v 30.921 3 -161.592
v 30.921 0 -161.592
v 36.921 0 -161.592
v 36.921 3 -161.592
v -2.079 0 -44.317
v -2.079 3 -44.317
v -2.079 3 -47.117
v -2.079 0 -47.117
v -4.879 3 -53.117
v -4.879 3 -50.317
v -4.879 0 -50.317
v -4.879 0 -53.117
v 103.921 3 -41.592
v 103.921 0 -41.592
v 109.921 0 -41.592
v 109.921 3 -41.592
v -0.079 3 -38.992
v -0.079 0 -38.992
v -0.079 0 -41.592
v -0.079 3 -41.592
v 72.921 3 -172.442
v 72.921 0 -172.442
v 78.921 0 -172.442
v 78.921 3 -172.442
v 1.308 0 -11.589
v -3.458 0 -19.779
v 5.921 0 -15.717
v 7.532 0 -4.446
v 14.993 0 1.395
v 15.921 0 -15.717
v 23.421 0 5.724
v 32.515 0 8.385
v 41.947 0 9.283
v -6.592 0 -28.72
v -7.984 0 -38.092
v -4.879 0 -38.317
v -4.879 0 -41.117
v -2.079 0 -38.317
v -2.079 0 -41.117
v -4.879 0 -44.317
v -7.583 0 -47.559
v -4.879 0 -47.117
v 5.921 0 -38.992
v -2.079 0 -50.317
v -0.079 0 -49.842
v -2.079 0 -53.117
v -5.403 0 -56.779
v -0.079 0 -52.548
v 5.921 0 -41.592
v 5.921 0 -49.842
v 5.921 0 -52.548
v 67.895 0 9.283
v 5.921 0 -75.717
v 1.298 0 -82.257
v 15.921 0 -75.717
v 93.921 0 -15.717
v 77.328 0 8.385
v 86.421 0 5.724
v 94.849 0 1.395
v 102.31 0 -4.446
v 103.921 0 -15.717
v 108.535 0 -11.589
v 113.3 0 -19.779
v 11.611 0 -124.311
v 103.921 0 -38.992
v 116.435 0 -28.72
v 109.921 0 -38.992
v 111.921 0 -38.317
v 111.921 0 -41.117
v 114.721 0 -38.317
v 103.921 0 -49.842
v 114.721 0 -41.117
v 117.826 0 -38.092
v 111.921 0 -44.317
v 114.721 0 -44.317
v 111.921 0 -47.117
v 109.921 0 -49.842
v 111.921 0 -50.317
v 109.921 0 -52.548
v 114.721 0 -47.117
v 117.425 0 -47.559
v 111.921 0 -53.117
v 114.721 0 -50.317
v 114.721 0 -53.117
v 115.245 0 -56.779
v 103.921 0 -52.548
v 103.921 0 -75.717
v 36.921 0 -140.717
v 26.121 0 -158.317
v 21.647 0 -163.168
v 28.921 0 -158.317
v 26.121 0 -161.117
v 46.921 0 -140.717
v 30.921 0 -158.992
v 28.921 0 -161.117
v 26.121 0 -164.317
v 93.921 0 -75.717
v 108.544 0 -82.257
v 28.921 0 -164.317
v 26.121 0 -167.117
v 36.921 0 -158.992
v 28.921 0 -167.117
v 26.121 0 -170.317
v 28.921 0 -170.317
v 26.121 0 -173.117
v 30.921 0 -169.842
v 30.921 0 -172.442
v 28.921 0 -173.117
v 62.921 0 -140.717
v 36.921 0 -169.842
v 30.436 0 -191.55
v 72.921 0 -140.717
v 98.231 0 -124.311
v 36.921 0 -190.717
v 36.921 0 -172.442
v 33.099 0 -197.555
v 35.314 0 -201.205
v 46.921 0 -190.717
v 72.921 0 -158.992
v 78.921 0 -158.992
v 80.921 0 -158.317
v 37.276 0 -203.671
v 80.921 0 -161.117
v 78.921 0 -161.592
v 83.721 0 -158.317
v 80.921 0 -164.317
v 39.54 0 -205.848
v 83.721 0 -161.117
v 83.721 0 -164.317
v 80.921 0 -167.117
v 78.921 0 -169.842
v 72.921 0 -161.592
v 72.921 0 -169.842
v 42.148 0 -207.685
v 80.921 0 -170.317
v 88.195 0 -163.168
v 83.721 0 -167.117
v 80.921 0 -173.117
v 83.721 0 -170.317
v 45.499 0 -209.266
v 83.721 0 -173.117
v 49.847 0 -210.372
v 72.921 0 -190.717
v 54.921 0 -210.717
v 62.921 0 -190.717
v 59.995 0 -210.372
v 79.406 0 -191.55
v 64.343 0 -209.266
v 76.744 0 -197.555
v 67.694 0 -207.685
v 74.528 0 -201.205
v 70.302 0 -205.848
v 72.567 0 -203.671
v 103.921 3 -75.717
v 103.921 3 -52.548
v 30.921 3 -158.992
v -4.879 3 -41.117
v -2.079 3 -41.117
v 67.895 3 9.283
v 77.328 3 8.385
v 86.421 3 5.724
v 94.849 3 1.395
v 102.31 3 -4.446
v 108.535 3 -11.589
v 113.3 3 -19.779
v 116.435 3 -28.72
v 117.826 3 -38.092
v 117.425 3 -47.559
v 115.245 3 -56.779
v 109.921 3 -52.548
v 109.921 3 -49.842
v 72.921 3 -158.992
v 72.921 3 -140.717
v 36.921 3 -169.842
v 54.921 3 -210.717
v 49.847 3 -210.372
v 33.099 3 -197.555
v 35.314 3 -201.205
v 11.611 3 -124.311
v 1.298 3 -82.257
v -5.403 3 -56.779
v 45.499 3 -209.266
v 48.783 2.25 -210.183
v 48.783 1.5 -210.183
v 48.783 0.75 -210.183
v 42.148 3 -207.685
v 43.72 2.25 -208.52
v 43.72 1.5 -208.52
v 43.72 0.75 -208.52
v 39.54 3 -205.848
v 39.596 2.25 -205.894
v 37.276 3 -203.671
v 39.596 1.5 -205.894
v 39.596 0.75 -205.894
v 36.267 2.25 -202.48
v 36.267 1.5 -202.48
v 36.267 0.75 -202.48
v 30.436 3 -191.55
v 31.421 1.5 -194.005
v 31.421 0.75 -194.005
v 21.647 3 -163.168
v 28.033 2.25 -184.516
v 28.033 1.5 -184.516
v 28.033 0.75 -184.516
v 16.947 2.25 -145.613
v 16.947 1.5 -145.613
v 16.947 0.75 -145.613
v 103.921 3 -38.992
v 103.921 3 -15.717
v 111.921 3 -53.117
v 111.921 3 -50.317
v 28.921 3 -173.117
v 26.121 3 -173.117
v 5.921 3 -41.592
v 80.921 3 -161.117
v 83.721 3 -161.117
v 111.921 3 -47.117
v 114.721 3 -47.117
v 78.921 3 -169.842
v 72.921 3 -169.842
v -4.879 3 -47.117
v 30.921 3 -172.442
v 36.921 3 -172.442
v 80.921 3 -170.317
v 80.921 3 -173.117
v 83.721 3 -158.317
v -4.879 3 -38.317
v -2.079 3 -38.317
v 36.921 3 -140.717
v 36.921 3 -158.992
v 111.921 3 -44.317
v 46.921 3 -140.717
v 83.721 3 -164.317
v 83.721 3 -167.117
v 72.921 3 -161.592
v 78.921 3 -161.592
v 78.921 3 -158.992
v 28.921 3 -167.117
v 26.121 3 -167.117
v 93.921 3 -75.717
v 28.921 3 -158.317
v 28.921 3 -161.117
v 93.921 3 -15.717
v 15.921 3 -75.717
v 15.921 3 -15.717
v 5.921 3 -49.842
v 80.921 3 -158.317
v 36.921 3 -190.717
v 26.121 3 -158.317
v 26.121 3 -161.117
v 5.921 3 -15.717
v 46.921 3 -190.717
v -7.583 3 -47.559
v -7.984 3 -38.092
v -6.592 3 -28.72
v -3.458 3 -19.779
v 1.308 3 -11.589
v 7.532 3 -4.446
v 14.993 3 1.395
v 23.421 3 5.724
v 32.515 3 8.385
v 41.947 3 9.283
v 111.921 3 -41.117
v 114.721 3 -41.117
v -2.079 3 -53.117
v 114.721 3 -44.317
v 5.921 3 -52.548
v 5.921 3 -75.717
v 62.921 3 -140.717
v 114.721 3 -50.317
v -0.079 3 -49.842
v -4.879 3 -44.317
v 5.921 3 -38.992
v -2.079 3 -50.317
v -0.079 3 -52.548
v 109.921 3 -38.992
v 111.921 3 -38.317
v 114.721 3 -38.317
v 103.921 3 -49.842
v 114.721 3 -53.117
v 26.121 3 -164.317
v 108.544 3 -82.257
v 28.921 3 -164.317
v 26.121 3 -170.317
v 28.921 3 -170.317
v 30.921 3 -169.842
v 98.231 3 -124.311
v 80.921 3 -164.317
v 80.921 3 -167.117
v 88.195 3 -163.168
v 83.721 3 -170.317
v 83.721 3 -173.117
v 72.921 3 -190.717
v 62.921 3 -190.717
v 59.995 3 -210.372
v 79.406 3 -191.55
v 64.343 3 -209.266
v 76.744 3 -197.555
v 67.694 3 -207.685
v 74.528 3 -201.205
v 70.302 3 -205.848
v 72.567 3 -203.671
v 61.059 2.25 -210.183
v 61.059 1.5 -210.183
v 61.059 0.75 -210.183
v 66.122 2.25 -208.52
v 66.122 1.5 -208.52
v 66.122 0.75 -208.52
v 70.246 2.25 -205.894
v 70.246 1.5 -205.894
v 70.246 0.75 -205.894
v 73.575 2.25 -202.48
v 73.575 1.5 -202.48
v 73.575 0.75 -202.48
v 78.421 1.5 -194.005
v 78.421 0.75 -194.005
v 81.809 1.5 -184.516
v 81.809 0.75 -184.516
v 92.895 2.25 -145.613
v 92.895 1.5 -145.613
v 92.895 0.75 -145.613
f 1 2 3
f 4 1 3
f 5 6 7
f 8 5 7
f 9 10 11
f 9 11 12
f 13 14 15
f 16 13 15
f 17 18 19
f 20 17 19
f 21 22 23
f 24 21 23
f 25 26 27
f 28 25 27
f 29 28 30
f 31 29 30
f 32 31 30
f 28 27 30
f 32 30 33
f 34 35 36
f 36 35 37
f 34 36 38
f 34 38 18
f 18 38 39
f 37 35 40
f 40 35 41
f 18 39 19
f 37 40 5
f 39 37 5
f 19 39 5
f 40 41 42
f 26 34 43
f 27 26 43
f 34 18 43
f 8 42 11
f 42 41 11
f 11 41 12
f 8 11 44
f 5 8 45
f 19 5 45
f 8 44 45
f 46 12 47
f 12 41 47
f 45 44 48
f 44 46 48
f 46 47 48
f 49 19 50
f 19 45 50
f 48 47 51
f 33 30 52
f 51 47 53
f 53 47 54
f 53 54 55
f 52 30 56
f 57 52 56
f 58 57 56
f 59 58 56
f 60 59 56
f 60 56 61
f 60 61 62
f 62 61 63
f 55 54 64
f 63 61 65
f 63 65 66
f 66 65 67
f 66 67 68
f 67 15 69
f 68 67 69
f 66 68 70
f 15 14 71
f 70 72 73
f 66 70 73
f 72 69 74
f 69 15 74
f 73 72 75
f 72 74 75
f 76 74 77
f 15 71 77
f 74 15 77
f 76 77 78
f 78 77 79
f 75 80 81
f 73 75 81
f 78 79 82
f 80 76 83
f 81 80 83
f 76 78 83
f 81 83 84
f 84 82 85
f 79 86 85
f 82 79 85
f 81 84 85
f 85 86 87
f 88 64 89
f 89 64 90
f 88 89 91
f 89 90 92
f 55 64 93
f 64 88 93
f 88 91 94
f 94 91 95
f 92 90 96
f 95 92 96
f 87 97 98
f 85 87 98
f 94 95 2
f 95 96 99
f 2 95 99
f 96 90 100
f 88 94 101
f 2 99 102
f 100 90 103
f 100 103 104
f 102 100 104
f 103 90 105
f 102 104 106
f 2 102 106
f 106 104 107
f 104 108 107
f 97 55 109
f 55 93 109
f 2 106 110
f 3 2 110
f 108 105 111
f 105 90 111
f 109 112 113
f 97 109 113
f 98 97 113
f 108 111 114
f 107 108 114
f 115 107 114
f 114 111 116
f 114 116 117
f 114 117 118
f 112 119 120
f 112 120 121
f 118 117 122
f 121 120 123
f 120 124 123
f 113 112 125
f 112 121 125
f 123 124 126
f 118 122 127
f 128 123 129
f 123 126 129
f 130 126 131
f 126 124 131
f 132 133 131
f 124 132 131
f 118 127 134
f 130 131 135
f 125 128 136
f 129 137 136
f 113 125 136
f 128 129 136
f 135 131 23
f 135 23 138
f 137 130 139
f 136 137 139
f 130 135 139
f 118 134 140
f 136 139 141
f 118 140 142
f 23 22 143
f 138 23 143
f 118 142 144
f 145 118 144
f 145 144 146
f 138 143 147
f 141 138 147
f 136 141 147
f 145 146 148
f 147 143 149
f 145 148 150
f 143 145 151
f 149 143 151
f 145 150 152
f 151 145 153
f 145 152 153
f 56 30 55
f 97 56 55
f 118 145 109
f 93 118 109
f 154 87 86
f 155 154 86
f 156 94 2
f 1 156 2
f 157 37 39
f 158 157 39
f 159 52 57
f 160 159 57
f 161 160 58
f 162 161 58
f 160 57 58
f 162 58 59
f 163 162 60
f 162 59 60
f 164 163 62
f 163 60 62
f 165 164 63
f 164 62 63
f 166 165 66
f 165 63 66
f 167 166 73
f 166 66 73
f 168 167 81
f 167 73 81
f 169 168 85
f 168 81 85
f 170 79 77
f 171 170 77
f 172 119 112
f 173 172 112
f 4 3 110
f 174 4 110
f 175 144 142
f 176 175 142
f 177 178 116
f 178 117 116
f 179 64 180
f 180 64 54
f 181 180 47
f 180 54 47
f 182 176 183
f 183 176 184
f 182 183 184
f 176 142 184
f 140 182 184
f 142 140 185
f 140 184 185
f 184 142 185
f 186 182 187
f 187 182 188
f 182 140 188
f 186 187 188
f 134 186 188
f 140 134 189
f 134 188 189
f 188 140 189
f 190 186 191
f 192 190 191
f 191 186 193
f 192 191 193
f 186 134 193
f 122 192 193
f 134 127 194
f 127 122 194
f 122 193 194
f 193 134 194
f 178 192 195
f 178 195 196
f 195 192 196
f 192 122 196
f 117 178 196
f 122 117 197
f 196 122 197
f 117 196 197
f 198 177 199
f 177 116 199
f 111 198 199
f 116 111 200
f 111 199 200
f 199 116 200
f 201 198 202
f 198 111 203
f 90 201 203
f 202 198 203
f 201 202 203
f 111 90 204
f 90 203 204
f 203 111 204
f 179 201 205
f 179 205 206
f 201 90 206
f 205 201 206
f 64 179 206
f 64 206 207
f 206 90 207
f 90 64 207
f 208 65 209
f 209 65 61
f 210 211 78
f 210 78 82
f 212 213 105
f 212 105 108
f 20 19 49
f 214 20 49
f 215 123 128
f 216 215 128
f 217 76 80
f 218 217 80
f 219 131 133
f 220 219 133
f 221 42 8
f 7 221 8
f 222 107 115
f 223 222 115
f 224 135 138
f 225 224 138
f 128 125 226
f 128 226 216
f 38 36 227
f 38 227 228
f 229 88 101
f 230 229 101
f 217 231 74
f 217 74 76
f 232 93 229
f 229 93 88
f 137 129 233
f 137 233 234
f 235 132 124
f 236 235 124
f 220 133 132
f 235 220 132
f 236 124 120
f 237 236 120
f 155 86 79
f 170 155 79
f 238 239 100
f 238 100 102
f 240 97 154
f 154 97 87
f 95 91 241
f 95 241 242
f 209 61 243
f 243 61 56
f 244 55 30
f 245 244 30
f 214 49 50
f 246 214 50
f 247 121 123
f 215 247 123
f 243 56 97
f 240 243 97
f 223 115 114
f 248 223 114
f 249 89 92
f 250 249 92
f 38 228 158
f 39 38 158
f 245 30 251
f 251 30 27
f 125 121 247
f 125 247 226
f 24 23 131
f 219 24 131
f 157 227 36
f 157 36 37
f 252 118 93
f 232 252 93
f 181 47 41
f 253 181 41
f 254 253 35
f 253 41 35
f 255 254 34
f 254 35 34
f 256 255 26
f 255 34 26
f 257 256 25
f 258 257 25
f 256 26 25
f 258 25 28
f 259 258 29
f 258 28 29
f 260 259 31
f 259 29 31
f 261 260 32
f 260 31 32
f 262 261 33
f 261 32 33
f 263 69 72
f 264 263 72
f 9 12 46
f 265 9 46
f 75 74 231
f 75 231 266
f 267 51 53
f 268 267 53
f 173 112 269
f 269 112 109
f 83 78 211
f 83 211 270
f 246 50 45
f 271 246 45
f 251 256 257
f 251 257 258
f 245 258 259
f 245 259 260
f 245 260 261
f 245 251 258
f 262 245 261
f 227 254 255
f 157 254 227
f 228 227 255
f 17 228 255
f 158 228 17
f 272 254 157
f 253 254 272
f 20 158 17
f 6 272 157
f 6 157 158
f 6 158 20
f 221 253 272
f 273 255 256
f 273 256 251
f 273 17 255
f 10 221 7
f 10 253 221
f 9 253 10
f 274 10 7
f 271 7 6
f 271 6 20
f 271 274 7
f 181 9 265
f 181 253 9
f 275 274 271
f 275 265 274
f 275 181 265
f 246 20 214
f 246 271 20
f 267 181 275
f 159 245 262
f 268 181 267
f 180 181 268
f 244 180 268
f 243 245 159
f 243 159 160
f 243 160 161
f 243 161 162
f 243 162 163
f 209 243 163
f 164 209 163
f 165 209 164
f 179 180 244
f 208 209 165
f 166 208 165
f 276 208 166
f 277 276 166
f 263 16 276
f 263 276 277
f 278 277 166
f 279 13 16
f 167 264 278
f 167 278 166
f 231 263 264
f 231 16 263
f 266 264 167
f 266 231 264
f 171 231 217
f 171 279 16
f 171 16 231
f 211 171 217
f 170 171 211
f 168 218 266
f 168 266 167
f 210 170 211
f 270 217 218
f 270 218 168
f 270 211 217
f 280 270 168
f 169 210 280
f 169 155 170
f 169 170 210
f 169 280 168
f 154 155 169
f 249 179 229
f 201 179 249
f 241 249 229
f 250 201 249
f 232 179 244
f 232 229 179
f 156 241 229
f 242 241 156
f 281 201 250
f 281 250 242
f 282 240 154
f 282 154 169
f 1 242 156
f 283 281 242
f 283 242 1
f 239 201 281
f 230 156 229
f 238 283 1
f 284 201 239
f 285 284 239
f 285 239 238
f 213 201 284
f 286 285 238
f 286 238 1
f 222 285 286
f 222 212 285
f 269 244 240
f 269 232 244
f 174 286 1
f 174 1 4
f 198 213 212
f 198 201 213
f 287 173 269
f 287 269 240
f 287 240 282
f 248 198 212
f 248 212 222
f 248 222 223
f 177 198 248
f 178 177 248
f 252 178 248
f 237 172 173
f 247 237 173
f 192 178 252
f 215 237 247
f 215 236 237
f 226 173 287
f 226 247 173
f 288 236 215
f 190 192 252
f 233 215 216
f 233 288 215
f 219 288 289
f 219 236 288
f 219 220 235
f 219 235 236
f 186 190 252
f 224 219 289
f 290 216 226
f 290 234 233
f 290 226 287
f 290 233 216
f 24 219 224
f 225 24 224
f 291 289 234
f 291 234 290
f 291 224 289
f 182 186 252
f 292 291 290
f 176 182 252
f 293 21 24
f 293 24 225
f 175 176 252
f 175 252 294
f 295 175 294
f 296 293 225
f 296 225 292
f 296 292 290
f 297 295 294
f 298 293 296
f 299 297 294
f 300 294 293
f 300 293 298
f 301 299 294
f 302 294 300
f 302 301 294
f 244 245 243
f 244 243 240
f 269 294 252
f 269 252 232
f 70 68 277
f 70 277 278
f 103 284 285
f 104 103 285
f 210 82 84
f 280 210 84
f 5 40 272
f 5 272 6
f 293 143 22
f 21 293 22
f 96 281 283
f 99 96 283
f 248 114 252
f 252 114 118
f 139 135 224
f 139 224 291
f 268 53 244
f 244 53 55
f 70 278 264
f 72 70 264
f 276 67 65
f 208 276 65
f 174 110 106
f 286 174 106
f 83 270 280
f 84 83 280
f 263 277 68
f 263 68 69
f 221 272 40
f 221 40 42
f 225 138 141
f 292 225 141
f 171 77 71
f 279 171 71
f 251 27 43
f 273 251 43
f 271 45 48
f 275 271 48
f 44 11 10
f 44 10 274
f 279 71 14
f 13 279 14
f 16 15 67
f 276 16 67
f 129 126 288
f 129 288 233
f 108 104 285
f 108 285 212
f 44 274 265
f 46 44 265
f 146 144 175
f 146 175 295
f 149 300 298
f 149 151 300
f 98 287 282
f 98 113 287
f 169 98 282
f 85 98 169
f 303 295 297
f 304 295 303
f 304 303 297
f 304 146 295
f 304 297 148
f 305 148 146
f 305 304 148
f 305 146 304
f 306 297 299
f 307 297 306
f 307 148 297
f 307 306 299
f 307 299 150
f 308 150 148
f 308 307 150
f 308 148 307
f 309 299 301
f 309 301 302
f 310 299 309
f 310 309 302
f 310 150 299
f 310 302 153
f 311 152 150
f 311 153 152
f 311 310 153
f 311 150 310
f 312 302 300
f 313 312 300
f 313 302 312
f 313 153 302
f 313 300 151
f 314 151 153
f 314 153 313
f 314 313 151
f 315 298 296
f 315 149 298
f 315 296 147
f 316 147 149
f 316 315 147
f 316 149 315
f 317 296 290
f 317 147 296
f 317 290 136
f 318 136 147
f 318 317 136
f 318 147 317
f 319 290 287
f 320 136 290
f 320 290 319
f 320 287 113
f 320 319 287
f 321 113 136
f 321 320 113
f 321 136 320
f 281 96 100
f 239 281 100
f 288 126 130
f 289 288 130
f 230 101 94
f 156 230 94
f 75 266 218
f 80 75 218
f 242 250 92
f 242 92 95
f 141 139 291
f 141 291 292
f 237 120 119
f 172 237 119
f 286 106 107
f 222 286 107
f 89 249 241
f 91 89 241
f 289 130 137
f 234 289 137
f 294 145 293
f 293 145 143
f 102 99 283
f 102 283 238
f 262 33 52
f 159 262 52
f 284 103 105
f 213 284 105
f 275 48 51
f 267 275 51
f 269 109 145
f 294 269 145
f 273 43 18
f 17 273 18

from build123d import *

# Parameters (mm, degrees)
SKETCH1_W           = 2.8
SKETCH1_H           = 2.8
BOSS_EXTRUDE1_DEPTH = 3


with BuildPart() as part:
    # Sketch1 → Boss-Extrude1 (new body)
    # profile 1 of 2: a face of its own
    with BuildSketch(Plane(origin=(0, 0, 0), x_dir=(1, 0, 0), z_dir=(0, 1, 0))):
        with BuildLine():
            add(Edge.make_bspline(
                [(54.921096065, 210.717166967), (55.81137077, 210.717166967), (73.117418641, 210.307735596), (83.168598293, 181.782075712), (97.327570014, 130.307145356), (107.26026966, 85.588568253), (115.245027256, 56.779324779)],
                knots=[0, 0, 0, 0, 0.011068307, 0.221366141, 0.459883166, 1, 1, 1, 1], degree=3))
            Line((54.921096065, 210.717166967), (54.921096065, -9.282833033))
            Line((54.921096065, -9.282833033), (64.921096065, -9.282833033))
            Line((64.921096065, -9.282833033), (67.895190019, -9.282833033))
            ThreePointArc((67.895190019, -9.282833033), (108.534505285, 11.589069626), (115.245027256, 56.779324779))
        make_face()
        with Locations((113.321095998, 39.717166967)):
            Rectangle(SKETCH1_W, SKETCH1_H, mode=Mode.SUBTRACT)
        Polygon((103.921096065, 38.99216559), (103.921096065, 15.717166967), (93.921096065, 15.717166967), (93.921096065, 75.717166967), (103.921096065, 75.717166967), (103.921096065, 52.548230604), (109.921096065, 52.548230604), (109.921096065, 49.842166967), (103.921096065, 49.842166967), (103.921096065, 41.59216559), (109.921095998, 41.59216559), (109.921095998, 38.99216559), align=None, mode=Mode.SUBTRACT)
        with Locations((113.321096065, 45.717166967)):
            Rectangle(SKETCH1_W, SKETCH1_H, mode=Mode.SUBTRACT)
        with Locations((113.321096065, 51.717166967)):
            Rectangle(SKETCH1_W, SKETCH1_H, mode=Mode.SUBTRACT)
        Polygon((72.921096065, 158.992166967), (72.921096065, 140.717166967), (62.921096065, 140.717166967), (62.921096065, 190.717166967), (72.921096065, 190.717166967), (72.921096065, 172.442166967), (78.921096065, 172.442166967), (78.921096065, 169.842166967), (72.921096065, 169.842166967), (72.921096065, 161.592166967), (78.921096065, 161.592166967), (78.921096065, 158.992166967), align=None, mode=Mode.SUBTRACT)
        with Locations((82.321096065, 159.717166967)):
            Rectangle(SKETCH1_W, SKETCH1_H, mode=Mode.SUBTRACT)
        with Locations((82.321096065, 165.717166967)):
            Rectangle(SKETCH1_W, SKETCH1_H, mode=Mode.SUBTRACT)
        with Locations((82.321096065, 171.717166967)):
            Rectangle(SKETCH1_W, SKETCH1_H, mode=Mode.SUBTRACT)
    # profile 2 of 2: a face of its own
    with BuildSketch(Plane(origin=(0, 0, 0), x_dir=(1, 0, 0), z_dir=(0, 1, 0))):
        with BuildLine():
            Line((54.921096065, -9.282833033), (54.921096065, 210.717166967))
            add(Edge.make_bspline(
                [(54.921096065, 210.717166967), (54.030821359, 210.717166967), (36.724773488, 210.307735596), (26.673593836, 181.782075712), (12.514622115, 130.307145356), (2.58192247, 85.588568253), (-5.402835127, 56.779324779)],
                knots=[0, 0, 0, 0, 0.011068307, 0.221366141, 0.459883166, 1, 1, 1, 1], degree=3))
            ThreePointArc((-5.402835127, 56.779324779), (1.307686844, 11.589069626), (41.94700211, -9.282833033))
            Line((41.94700211, -9.282833033), (44.921096065, -9.282833033))
            Line((44.921096065, -9.282833033), (54.921096065, -9.282833033))
        make_face()
        with Locations((-3.478903869, 39.717166967)):
            Rectangle(SKETCH1_W, SKETCH1_H, mode=Mode.SUBTRACT)
        with Locations((-3.478903935, 45.717166967)):
            Rectangle(SKETCH1_W, SKETCH1_H, mode=Mode.SUBTRACT)
        with Locations((-3.478903935, 51.717166967)):
            Rectangle(SKETCH1_W, SKETCH1_H, mode=Mode.SUBTRACT)
        Polygon((5.921096065, 52.548230604), (5.921096065, 75.717166967), (15.921096065, 75.717166967), (15.921096065, 15.717166967), (5.921096065, 15.717166967), (5.921096065, 38.99216559), (-0.078903869, 38.99216559), (-0.078903869, 41.59216559), (5.921096131, 41.59216559), (5.921096065, 49.842166967), (-0.078903935, 49.842166967), (-0.078903935, 52.548230604), align=None, mode=Mode.SUBTRACT)
        with Locations((27.521096065, 159.717166967)):
            Rectangle(SKETCH1_W, SKETCH1_H, mode=Mode.SUBTRACT)
        with Locations((27.521096065, 165.717166967)):
            Rectangle(SKETCH1_W, SKETCH1_H, mode=Mode.SUBTRACT)
        Polygon((36.921096065, 172.442166967), (36.921096065, 190.717166967), (46.921096065, 190.717166967), (46.921096065, 140.717166967), (36.921096065, 140.717166967), (36.921096065, 158.992166967), (30.921096065, 158.992166967), (30.921096065, 161.592166967), (36.921096065, 161.592166967), (36.921096065, 169.842166967), (30.921096065, 169.842166967), (30.921096065, 172.442166967), align=None, mode=Mode.SUBTRACT)
        with Locations((27.521096065, 171.717166967)):
            Rectangle(SKETCH1_W, SKETCH1_H, mode=Mode.SUBTRACT)
    extrude(amount=BOSS_EXTRUDE1_DEPTH)


solid = part.part
